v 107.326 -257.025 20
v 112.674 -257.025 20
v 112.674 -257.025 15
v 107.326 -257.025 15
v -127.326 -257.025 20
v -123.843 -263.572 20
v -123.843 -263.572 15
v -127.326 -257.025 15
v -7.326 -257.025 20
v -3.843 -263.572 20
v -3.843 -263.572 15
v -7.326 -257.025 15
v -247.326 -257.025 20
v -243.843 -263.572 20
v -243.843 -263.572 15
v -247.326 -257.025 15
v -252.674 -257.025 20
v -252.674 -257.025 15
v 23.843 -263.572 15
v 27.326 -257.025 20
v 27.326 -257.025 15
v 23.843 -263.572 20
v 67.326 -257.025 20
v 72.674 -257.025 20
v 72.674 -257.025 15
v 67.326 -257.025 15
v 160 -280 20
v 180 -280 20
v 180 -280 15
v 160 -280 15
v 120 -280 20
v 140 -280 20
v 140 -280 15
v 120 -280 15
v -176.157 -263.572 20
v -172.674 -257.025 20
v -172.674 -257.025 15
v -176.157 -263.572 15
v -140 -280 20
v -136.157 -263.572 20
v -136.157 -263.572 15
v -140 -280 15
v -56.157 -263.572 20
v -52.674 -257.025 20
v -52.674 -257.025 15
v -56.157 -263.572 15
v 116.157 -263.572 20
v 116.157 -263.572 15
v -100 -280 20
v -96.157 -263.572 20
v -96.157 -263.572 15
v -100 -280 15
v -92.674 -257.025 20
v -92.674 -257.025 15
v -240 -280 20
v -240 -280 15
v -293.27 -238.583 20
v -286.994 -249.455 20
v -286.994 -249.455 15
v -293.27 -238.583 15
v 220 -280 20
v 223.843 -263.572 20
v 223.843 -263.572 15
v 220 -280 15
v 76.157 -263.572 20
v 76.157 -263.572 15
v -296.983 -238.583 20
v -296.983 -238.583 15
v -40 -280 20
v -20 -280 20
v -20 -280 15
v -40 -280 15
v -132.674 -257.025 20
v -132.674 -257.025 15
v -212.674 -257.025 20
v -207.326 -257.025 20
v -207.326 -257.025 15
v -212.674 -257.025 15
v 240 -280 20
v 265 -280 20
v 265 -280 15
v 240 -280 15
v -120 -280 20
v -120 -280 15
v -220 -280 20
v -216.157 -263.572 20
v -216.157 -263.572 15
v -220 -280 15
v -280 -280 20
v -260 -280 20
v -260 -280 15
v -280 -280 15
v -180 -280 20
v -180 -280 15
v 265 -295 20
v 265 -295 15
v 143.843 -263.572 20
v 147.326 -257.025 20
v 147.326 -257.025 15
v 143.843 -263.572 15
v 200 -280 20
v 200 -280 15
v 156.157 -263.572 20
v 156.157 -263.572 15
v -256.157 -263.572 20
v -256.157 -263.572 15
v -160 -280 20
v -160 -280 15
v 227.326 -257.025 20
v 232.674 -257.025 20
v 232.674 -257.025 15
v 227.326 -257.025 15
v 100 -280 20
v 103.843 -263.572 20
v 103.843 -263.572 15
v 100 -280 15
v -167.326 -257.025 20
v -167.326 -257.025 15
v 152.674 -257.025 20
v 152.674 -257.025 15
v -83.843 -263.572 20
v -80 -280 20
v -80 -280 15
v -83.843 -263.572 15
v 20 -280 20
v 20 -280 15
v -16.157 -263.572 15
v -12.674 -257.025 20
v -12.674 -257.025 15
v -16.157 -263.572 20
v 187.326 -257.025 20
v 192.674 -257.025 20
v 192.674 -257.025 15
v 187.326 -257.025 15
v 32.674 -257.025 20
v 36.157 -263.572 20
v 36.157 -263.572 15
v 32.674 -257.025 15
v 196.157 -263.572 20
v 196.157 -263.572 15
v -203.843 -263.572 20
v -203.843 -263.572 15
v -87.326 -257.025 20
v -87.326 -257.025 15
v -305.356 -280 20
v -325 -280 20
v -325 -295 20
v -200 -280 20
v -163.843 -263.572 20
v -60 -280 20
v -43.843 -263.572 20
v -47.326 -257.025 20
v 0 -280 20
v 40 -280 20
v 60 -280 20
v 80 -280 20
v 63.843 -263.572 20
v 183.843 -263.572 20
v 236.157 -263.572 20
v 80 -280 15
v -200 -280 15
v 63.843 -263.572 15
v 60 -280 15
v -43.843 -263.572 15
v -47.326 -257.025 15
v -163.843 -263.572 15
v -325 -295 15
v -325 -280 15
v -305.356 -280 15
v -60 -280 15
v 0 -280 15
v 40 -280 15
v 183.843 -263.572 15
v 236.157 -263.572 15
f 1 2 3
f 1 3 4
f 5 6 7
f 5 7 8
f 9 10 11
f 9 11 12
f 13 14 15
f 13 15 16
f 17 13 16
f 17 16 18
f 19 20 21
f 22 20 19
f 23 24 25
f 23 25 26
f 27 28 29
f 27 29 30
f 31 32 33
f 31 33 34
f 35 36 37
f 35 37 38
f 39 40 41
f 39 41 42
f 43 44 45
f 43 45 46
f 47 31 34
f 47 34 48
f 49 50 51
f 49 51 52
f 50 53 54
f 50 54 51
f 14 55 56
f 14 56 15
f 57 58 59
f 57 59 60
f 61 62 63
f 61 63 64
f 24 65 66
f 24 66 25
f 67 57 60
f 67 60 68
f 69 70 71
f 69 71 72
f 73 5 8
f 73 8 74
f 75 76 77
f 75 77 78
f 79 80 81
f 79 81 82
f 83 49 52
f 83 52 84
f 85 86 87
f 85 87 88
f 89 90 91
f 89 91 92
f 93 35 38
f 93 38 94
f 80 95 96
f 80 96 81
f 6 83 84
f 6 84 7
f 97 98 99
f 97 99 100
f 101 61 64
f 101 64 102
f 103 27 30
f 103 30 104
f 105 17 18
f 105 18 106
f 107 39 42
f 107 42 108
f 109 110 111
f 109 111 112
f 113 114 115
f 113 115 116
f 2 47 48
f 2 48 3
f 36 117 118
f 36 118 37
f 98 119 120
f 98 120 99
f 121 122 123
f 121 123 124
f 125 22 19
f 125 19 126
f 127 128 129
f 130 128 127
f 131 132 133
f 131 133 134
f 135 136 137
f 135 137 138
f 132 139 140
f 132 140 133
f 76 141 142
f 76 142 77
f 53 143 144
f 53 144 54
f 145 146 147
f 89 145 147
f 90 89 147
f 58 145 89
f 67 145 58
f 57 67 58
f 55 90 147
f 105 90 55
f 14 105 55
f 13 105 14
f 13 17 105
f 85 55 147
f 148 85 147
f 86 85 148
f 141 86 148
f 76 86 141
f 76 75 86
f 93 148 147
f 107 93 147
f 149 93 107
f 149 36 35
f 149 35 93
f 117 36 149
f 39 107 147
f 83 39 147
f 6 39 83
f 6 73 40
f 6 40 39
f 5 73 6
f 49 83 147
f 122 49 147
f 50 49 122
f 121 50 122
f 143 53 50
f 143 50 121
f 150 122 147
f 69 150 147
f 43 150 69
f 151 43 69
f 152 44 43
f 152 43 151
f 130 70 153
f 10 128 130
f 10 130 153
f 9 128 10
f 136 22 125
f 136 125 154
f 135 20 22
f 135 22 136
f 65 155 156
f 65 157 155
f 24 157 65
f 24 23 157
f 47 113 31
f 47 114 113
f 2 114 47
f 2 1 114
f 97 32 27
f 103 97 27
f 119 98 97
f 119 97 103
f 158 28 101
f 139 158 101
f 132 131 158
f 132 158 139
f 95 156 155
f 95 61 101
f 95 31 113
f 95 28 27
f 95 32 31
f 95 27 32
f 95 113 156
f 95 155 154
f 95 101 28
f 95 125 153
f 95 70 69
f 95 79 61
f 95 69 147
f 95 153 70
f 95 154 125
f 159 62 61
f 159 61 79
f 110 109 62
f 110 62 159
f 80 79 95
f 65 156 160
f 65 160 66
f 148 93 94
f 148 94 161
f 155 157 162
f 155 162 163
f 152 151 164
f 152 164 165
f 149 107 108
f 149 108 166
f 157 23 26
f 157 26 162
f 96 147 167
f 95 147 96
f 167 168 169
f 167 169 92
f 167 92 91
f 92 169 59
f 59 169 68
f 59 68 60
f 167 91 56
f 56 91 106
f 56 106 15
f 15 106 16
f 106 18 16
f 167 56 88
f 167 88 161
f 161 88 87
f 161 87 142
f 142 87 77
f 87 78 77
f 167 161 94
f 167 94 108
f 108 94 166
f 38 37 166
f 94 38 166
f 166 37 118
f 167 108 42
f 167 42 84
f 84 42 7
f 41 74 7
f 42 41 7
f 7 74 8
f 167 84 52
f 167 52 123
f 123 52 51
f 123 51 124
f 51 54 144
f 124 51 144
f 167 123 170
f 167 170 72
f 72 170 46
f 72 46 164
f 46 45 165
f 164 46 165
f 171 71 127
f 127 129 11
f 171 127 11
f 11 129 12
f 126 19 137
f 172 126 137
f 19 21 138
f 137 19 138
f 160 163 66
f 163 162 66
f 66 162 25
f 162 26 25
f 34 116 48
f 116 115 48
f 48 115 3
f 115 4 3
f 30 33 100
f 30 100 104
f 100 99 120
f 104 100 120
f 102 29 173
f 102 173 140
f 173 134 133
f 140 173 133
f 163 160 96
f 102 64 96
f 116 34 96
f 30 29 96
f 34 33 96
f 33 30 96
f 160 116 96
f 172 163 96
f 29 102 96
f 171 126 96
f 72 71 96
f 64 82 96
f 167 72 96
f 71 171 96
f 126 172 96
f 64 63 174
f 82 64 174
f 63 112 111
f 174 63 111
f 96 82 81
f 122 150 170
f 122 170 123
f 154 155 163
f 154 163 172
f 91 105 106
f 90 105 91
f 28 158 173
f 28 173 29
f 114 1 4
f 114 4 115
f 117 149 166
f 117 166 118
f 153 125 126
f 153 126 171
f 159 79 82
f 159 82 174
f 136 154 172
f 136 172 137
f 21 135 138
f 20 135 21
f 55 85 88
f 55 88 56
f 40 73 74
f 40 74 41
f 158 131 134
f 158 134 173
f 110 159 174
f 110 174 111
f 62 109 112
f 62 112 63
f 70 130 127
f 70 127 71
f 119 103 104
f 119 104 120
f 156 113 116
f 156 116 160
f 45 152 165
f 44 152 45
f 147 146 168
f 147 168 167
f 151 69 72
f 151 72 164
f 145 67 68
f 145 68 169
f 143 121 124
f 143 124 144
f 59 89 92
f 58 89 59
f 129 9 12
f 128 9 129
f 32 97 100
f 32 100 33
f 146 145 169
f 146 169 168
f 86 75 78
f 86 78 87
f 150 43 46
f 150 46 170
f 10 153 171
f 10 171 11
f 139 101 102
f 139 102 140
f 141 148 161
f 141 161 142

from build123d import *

# Parameters (mm, degrees)
F0_W     = 750
F0_H     = 50
F1_DEPTH = 20
F2_W     = 50
F2_H     = 660
F3_DEPTH = 10
F5_DEPTH = 5
F9_DEPTH = 5


with BuildPart() as f1:
    # F0 (on Top) → F1 (new body)
    with BuildSketch(Plane.XY):
        with Locations((0, -305)):
            Rectangle(F0_W, F0_H)
    extrude(amount=F1_DEPTH)


with BuildPart() as f1b:
    # F0 (on Top) → F1, piece 2 (new body)
    with BuildSketch(Plane.XY):
        with Locations((0, 305)):
            Rectangle(F0_W, F0_H)
    extrude(amount=F1_DEPTH)


with BuildPart() as f3:
    # F2 (on face) → F3 (new body)
    with BuildSketch(Plane.XY.offset(20)):
        with Locations((-337.1062517166, 0)):
            Rectangle(F2_W, F2_H)
    extrude(amount=F3_DEPTH)


with BuildPart() as f3b:
    # F2 (on face) → F3, piece 2 (new body)
    with BuildSketch(Plane.XY.offset(20)):
        with Locations((337.1062517166, 0)):
            Rectangle(F2_W, F2_H)
    extrude(amount=F3_DEPTH)


with BuildPart() as f3c:
    # F2 (on face) → F3, piece 3 (new body)
    with BuildSketch(Plane.XY.offset(20)):
        with Locations((-130.3327232599, 0)):
            Rectangle(F2_W, F2_H)
    extrude(amount=F3_DEPTH)


with BuildPart() as f3d:
    # F2 (on face) → F3, piece 4 (new body)
    with BuildSketch(Plane.XY.offset(20)):
        with Locations((130.3327232599, 0)):
            Rectangle(F2_W, F2_H)
    extrude(amount=F3_DEPTH)


with BuildPart() as f5:
    # F4 (on face) → F5 (new body)
    with BuildSketch(Plane.XY.offset(20)):
        Polygon((-296.1573302746, -263.5724842548), (-300, -280), (-280, -280), (-283.8426697254, -263.5724842548), (-287.3255479336, -257.0246756077), (-290, -257.0246756077), (-292.6744520664, -257.0246756077), align=None)
        Polygon((-280, -280), (-300, -280), (-325, -280), (-325, -295), (265, -295), (265, -280), (240, -280), (220, -280), (200, -280), (180, -280), (160, -280), (140, -280), (120, -280), (100, -280), (80, -280), (60, -280), (40, -280), (20, -280), (0, -280), (-20, -280), (-40, -280), (-60, -280), (-80, -280), (-100, -280), (-120, -280), (-140, -280), (-160, -280), (-180, -280), (-200, -280), (-220, -280), (-240, -280), (-260, -280), align=None)
        Polygon((-256.1573302746, -263.5724842548), (-260, -280), (-240, -280), (-243.8426697254, -263.5724842548), (-247.3255479336, -257.0246756077), (-250, -257.0246756077), (-252.6744520664, -257.0246756077), align=None)
        Polygon((-216.1573302746, -263.5724842548), (-220, -280), (-200, -280), (-203.8426697254, -263.5724842548), (-207.3255479336, -257.0246756077), (-210, -257.0246756077), (-212.6744520664, -257.0246756077), align=None)
        Polygon((220, -280), (240, -280), (236.1573302746, -263.5724842548), (232.6744520664, -257.0246756077), (230, -257.0246756077), (227.3255479336, -257.0246756077), (223.8426697254, -263.5724842548), align=None)
        Polygon((-176.1573302746, -263.5724842548), (-180, -280), (-160, -280), (-163.8426697254, -263.5724842548), (-167.3255479336, -257.0246756077), (-170, -257.0246756077), (-172.6744520664, -257.0246756077), align=None)
        Polygon((180, -280), (200, -280), (196.1573302746, -263.5724842548), (192.6744520664, -257.0246756077), (190, -257.0246756077), (187.3255479336, -257.0246756077), (183.8426697254, -263.5724842548), align=None)
        Polygon((-136.1573302746, -263.5724842548), (-140, -280), (-120, -280), (-123.8426697254, -263.5724842548), (-127.3255479336, -257.0246756077), (-130, -257.0246756077), (-132.6744520664, -257.0246756077), align=None)
        Polygon((140, -280), (160, -280), (156.1573302746, -263.5724842548), (152.6744520664, -257.0246756077), (150, -257.0246756077), (147.3255479336, -257.0246756077), (143.8426697254, -263.5724842548), align=None)
        Polygon((-96.1573302746, -263.5724842548), (-100, -280), (-80, -280), (-83.8426697254, -263.5724842548), (-87.3255479336, -257.0246756077), (-90, -257.0246756077), (-92.6744520664, -257.0246756077), align=None)
        Polygon((100, -280), (120, -280), (116.1573302746, -263.5724842548), (112.6744520664, -257.0246756077), (110, -257.0246756077), (107.3255479336, -257.0246756077), (103.8426697254, -263.5724842548), align=None)
        Polygon((-56.1573302746, -263.5724842548), (-60, -280), (-40, -280), (-43.8426697254, -263.5724842548), (-47.3255479336, -257.0246756077), (-50, -257.0246756077), (-52.6744520664, -257.0246756077), align=None)
        Polygon((60, -280), (80, -280), (76.1573302746, -263.5724842548), (72.6744520664, -257.0246756077), (70, -257.0246756077), (67.3255479336, -257.0246756077), (63.8426697254, -263.5724842548), align=None)
        Polygon((-16.1573302746, -263.5724842548), (-20, -280), (0, -280), (-3.8426697254, -263.5724842548), (-7.3255479336, -257.0246756077), (-10, -257.0246756077), (-12.6744520664, -257.0246756077), align=None)
        Polygon((20, -280), (40, -280), (36.1573302746, -263.5724842548), (32.6744520664, -257.0246756077), (30, -257.0246756077), (27.3255479336, -257.0246756077), (23.8426697254, -263.5724842548), align=None)
    extrude(amount=-F5_DEPTH)

    # F8 (on face) → F9 (join)
    with BuildSketch(Plane.XY.offset(20)):
        Polygon((-280, -280), (-286.9936227798, -249.4549155235), (-293.270021677, -238.5834902525), (-296.9827055931, -238.5834902525), (-305.3558170795, -280), align=None)
    extrude(amount=-F9_DEPTH)


with BuildPart() as f5b:
    # F4 (on face) → F5, piece 2 (new body)
    with BuildSketch(Plane.XY.offset(20)):
        Polygon((-280, 280), (-300, 280), (-296.1573302746, 263.5724842548), (-292.6744520664, 257.0246756077), (-290, 257.0246756077), (-287.3255479336, 257.0246756077), (-283.8426697254, 263.5724842548), align=None)
        Polygon((-325, 280), (-300, 280), (-280, 280), (-260, 280), (-240, 280), (-220, 280), (-200, 280), (-180, 280), (-160, 280), (-140, 280), (-120, 280), (-100, 280), (-80, 280), (-60, 280), (-40, 280), (-20, 280), (0, 280), (20, 280), (40, 280), (60, 280), (80, 280), (100, 280), (120, 280), (140, 280), (160, 280), (180, 280), (200, 280), (220, 280), (240, 280), (265, 280), (265, 305), (-325, 305), align=None)
        Polygon((-240, 280), (-260, 280), (-256.1573302746, 263.5724842548), (-252.6744520664, 257.0246756077), (-250, 257.0246756077), (-247.3255479336, 257.0246756077), (-243.8426697254, 263.5724842548), align=None)
        Polygon((-200, 280), (-220, 280), (-216.1573302746, 263.5724842548), (-212.6744520664, 257.0246756077), (-210, 257.0246756077), (-207.3255479336, 257.0246756077), (-203.8426697254, 263.5724842548), align=None)
        Polygon((236.1573302746, 263.5724842548), (240, 280), (220, 280), (223.8426697254, 263.5724842548), (227.3255479336, 257.0246756077), (230, 257.0246756077), (232.6744520664, 257.0246756077), align=None)
        Polygon((-160, 280), (-180, 280), (-176.1573302746, 263.5724842548), (-172.6744520664, 257.0246756077), (-170, 257.0246756077), (-167.3255479336, 257.0246756077), (-163.8426697254, 263.5724842548), align=None)
        Polygon((196.1573302746, 263.5724842548), (200, 280), (180, 280), (183.8426697254, 263.5724842548), (187.3255479336, 257.0246756077), (190, 257.0246756077), (192.6744520664, 257.0246756077), align=None)
        Polygon((-120, 280), (-140, 280), (-136.1573302746, 263.5724842548), (-132.6744520664, 257.0246756077), (-130, 257.0246756077), (-127.3255479336, 257.0246756077), (-123.8426697254, 263.5724842548), align=None)
        Polygon((156.1573302746, 263.5724842548), (160, 280), (140, 280), (143.8426697254, 263.5724842548), (147.3255479336, 257.0246756077), (150, 257.0246756077), (152.6744520664, 257.0246756077), align=None)
        Polygon((-80, 280), (-100, 280), (-96.1573302746, 263.5724842548), (-92.6744520664, 257.0246756077), (-90, 257.0246756077), (-87.3255479336, 257.0246756077), (-83.8426697254, 263.5724842548), align=None)
        Polygon((116.1573302746, 263.5724842548), (120, 280), (100, 280), (103.8426697254, 263.5724842548), (107.3255479336, 257.0246756077), (110, 257.0246756077), (112.6744520664, 257.0246756077), align=None)
        Polygon((-40, 280), (-60, 280), (-56.1573302746, 263.5724842548), (-52.6744520664, 257.0246756077), (-50, 257.0246756077), (-47.3255479336, 257.0246756077), (-43.8426697254, 263.5724842548), align=None)
        Polygon((76.1573302746, 263.5724842548), (80, 280), (60, 280), (63.8426697254, 263.5724842548), (67.3255479336, 257.0246756077), (70, 257.0246756077), (72.6744520664, 257.0246756077), align=None)
        Polygon((0, 280), (-20, 280), (-16.1573302746, 263.5724842548), (-12.6744520664, 257.0246756077), (-10, 257.0246756077), (-7.3255479336, 257.0246756077), (-3.8426697254, 263.5724842548), align=None)
        Polygon((36.1573302746, 263.5724842548), (40, 280), (20, 280), (23.8426697254, 263.5724842548), (27.3255479336, 257.0246756077), (30, 257.0246756077), (32.6744520664, 257.0246756077), align=None)
    extrude(amount=-F5_DEPTH)


solid = f5.part
